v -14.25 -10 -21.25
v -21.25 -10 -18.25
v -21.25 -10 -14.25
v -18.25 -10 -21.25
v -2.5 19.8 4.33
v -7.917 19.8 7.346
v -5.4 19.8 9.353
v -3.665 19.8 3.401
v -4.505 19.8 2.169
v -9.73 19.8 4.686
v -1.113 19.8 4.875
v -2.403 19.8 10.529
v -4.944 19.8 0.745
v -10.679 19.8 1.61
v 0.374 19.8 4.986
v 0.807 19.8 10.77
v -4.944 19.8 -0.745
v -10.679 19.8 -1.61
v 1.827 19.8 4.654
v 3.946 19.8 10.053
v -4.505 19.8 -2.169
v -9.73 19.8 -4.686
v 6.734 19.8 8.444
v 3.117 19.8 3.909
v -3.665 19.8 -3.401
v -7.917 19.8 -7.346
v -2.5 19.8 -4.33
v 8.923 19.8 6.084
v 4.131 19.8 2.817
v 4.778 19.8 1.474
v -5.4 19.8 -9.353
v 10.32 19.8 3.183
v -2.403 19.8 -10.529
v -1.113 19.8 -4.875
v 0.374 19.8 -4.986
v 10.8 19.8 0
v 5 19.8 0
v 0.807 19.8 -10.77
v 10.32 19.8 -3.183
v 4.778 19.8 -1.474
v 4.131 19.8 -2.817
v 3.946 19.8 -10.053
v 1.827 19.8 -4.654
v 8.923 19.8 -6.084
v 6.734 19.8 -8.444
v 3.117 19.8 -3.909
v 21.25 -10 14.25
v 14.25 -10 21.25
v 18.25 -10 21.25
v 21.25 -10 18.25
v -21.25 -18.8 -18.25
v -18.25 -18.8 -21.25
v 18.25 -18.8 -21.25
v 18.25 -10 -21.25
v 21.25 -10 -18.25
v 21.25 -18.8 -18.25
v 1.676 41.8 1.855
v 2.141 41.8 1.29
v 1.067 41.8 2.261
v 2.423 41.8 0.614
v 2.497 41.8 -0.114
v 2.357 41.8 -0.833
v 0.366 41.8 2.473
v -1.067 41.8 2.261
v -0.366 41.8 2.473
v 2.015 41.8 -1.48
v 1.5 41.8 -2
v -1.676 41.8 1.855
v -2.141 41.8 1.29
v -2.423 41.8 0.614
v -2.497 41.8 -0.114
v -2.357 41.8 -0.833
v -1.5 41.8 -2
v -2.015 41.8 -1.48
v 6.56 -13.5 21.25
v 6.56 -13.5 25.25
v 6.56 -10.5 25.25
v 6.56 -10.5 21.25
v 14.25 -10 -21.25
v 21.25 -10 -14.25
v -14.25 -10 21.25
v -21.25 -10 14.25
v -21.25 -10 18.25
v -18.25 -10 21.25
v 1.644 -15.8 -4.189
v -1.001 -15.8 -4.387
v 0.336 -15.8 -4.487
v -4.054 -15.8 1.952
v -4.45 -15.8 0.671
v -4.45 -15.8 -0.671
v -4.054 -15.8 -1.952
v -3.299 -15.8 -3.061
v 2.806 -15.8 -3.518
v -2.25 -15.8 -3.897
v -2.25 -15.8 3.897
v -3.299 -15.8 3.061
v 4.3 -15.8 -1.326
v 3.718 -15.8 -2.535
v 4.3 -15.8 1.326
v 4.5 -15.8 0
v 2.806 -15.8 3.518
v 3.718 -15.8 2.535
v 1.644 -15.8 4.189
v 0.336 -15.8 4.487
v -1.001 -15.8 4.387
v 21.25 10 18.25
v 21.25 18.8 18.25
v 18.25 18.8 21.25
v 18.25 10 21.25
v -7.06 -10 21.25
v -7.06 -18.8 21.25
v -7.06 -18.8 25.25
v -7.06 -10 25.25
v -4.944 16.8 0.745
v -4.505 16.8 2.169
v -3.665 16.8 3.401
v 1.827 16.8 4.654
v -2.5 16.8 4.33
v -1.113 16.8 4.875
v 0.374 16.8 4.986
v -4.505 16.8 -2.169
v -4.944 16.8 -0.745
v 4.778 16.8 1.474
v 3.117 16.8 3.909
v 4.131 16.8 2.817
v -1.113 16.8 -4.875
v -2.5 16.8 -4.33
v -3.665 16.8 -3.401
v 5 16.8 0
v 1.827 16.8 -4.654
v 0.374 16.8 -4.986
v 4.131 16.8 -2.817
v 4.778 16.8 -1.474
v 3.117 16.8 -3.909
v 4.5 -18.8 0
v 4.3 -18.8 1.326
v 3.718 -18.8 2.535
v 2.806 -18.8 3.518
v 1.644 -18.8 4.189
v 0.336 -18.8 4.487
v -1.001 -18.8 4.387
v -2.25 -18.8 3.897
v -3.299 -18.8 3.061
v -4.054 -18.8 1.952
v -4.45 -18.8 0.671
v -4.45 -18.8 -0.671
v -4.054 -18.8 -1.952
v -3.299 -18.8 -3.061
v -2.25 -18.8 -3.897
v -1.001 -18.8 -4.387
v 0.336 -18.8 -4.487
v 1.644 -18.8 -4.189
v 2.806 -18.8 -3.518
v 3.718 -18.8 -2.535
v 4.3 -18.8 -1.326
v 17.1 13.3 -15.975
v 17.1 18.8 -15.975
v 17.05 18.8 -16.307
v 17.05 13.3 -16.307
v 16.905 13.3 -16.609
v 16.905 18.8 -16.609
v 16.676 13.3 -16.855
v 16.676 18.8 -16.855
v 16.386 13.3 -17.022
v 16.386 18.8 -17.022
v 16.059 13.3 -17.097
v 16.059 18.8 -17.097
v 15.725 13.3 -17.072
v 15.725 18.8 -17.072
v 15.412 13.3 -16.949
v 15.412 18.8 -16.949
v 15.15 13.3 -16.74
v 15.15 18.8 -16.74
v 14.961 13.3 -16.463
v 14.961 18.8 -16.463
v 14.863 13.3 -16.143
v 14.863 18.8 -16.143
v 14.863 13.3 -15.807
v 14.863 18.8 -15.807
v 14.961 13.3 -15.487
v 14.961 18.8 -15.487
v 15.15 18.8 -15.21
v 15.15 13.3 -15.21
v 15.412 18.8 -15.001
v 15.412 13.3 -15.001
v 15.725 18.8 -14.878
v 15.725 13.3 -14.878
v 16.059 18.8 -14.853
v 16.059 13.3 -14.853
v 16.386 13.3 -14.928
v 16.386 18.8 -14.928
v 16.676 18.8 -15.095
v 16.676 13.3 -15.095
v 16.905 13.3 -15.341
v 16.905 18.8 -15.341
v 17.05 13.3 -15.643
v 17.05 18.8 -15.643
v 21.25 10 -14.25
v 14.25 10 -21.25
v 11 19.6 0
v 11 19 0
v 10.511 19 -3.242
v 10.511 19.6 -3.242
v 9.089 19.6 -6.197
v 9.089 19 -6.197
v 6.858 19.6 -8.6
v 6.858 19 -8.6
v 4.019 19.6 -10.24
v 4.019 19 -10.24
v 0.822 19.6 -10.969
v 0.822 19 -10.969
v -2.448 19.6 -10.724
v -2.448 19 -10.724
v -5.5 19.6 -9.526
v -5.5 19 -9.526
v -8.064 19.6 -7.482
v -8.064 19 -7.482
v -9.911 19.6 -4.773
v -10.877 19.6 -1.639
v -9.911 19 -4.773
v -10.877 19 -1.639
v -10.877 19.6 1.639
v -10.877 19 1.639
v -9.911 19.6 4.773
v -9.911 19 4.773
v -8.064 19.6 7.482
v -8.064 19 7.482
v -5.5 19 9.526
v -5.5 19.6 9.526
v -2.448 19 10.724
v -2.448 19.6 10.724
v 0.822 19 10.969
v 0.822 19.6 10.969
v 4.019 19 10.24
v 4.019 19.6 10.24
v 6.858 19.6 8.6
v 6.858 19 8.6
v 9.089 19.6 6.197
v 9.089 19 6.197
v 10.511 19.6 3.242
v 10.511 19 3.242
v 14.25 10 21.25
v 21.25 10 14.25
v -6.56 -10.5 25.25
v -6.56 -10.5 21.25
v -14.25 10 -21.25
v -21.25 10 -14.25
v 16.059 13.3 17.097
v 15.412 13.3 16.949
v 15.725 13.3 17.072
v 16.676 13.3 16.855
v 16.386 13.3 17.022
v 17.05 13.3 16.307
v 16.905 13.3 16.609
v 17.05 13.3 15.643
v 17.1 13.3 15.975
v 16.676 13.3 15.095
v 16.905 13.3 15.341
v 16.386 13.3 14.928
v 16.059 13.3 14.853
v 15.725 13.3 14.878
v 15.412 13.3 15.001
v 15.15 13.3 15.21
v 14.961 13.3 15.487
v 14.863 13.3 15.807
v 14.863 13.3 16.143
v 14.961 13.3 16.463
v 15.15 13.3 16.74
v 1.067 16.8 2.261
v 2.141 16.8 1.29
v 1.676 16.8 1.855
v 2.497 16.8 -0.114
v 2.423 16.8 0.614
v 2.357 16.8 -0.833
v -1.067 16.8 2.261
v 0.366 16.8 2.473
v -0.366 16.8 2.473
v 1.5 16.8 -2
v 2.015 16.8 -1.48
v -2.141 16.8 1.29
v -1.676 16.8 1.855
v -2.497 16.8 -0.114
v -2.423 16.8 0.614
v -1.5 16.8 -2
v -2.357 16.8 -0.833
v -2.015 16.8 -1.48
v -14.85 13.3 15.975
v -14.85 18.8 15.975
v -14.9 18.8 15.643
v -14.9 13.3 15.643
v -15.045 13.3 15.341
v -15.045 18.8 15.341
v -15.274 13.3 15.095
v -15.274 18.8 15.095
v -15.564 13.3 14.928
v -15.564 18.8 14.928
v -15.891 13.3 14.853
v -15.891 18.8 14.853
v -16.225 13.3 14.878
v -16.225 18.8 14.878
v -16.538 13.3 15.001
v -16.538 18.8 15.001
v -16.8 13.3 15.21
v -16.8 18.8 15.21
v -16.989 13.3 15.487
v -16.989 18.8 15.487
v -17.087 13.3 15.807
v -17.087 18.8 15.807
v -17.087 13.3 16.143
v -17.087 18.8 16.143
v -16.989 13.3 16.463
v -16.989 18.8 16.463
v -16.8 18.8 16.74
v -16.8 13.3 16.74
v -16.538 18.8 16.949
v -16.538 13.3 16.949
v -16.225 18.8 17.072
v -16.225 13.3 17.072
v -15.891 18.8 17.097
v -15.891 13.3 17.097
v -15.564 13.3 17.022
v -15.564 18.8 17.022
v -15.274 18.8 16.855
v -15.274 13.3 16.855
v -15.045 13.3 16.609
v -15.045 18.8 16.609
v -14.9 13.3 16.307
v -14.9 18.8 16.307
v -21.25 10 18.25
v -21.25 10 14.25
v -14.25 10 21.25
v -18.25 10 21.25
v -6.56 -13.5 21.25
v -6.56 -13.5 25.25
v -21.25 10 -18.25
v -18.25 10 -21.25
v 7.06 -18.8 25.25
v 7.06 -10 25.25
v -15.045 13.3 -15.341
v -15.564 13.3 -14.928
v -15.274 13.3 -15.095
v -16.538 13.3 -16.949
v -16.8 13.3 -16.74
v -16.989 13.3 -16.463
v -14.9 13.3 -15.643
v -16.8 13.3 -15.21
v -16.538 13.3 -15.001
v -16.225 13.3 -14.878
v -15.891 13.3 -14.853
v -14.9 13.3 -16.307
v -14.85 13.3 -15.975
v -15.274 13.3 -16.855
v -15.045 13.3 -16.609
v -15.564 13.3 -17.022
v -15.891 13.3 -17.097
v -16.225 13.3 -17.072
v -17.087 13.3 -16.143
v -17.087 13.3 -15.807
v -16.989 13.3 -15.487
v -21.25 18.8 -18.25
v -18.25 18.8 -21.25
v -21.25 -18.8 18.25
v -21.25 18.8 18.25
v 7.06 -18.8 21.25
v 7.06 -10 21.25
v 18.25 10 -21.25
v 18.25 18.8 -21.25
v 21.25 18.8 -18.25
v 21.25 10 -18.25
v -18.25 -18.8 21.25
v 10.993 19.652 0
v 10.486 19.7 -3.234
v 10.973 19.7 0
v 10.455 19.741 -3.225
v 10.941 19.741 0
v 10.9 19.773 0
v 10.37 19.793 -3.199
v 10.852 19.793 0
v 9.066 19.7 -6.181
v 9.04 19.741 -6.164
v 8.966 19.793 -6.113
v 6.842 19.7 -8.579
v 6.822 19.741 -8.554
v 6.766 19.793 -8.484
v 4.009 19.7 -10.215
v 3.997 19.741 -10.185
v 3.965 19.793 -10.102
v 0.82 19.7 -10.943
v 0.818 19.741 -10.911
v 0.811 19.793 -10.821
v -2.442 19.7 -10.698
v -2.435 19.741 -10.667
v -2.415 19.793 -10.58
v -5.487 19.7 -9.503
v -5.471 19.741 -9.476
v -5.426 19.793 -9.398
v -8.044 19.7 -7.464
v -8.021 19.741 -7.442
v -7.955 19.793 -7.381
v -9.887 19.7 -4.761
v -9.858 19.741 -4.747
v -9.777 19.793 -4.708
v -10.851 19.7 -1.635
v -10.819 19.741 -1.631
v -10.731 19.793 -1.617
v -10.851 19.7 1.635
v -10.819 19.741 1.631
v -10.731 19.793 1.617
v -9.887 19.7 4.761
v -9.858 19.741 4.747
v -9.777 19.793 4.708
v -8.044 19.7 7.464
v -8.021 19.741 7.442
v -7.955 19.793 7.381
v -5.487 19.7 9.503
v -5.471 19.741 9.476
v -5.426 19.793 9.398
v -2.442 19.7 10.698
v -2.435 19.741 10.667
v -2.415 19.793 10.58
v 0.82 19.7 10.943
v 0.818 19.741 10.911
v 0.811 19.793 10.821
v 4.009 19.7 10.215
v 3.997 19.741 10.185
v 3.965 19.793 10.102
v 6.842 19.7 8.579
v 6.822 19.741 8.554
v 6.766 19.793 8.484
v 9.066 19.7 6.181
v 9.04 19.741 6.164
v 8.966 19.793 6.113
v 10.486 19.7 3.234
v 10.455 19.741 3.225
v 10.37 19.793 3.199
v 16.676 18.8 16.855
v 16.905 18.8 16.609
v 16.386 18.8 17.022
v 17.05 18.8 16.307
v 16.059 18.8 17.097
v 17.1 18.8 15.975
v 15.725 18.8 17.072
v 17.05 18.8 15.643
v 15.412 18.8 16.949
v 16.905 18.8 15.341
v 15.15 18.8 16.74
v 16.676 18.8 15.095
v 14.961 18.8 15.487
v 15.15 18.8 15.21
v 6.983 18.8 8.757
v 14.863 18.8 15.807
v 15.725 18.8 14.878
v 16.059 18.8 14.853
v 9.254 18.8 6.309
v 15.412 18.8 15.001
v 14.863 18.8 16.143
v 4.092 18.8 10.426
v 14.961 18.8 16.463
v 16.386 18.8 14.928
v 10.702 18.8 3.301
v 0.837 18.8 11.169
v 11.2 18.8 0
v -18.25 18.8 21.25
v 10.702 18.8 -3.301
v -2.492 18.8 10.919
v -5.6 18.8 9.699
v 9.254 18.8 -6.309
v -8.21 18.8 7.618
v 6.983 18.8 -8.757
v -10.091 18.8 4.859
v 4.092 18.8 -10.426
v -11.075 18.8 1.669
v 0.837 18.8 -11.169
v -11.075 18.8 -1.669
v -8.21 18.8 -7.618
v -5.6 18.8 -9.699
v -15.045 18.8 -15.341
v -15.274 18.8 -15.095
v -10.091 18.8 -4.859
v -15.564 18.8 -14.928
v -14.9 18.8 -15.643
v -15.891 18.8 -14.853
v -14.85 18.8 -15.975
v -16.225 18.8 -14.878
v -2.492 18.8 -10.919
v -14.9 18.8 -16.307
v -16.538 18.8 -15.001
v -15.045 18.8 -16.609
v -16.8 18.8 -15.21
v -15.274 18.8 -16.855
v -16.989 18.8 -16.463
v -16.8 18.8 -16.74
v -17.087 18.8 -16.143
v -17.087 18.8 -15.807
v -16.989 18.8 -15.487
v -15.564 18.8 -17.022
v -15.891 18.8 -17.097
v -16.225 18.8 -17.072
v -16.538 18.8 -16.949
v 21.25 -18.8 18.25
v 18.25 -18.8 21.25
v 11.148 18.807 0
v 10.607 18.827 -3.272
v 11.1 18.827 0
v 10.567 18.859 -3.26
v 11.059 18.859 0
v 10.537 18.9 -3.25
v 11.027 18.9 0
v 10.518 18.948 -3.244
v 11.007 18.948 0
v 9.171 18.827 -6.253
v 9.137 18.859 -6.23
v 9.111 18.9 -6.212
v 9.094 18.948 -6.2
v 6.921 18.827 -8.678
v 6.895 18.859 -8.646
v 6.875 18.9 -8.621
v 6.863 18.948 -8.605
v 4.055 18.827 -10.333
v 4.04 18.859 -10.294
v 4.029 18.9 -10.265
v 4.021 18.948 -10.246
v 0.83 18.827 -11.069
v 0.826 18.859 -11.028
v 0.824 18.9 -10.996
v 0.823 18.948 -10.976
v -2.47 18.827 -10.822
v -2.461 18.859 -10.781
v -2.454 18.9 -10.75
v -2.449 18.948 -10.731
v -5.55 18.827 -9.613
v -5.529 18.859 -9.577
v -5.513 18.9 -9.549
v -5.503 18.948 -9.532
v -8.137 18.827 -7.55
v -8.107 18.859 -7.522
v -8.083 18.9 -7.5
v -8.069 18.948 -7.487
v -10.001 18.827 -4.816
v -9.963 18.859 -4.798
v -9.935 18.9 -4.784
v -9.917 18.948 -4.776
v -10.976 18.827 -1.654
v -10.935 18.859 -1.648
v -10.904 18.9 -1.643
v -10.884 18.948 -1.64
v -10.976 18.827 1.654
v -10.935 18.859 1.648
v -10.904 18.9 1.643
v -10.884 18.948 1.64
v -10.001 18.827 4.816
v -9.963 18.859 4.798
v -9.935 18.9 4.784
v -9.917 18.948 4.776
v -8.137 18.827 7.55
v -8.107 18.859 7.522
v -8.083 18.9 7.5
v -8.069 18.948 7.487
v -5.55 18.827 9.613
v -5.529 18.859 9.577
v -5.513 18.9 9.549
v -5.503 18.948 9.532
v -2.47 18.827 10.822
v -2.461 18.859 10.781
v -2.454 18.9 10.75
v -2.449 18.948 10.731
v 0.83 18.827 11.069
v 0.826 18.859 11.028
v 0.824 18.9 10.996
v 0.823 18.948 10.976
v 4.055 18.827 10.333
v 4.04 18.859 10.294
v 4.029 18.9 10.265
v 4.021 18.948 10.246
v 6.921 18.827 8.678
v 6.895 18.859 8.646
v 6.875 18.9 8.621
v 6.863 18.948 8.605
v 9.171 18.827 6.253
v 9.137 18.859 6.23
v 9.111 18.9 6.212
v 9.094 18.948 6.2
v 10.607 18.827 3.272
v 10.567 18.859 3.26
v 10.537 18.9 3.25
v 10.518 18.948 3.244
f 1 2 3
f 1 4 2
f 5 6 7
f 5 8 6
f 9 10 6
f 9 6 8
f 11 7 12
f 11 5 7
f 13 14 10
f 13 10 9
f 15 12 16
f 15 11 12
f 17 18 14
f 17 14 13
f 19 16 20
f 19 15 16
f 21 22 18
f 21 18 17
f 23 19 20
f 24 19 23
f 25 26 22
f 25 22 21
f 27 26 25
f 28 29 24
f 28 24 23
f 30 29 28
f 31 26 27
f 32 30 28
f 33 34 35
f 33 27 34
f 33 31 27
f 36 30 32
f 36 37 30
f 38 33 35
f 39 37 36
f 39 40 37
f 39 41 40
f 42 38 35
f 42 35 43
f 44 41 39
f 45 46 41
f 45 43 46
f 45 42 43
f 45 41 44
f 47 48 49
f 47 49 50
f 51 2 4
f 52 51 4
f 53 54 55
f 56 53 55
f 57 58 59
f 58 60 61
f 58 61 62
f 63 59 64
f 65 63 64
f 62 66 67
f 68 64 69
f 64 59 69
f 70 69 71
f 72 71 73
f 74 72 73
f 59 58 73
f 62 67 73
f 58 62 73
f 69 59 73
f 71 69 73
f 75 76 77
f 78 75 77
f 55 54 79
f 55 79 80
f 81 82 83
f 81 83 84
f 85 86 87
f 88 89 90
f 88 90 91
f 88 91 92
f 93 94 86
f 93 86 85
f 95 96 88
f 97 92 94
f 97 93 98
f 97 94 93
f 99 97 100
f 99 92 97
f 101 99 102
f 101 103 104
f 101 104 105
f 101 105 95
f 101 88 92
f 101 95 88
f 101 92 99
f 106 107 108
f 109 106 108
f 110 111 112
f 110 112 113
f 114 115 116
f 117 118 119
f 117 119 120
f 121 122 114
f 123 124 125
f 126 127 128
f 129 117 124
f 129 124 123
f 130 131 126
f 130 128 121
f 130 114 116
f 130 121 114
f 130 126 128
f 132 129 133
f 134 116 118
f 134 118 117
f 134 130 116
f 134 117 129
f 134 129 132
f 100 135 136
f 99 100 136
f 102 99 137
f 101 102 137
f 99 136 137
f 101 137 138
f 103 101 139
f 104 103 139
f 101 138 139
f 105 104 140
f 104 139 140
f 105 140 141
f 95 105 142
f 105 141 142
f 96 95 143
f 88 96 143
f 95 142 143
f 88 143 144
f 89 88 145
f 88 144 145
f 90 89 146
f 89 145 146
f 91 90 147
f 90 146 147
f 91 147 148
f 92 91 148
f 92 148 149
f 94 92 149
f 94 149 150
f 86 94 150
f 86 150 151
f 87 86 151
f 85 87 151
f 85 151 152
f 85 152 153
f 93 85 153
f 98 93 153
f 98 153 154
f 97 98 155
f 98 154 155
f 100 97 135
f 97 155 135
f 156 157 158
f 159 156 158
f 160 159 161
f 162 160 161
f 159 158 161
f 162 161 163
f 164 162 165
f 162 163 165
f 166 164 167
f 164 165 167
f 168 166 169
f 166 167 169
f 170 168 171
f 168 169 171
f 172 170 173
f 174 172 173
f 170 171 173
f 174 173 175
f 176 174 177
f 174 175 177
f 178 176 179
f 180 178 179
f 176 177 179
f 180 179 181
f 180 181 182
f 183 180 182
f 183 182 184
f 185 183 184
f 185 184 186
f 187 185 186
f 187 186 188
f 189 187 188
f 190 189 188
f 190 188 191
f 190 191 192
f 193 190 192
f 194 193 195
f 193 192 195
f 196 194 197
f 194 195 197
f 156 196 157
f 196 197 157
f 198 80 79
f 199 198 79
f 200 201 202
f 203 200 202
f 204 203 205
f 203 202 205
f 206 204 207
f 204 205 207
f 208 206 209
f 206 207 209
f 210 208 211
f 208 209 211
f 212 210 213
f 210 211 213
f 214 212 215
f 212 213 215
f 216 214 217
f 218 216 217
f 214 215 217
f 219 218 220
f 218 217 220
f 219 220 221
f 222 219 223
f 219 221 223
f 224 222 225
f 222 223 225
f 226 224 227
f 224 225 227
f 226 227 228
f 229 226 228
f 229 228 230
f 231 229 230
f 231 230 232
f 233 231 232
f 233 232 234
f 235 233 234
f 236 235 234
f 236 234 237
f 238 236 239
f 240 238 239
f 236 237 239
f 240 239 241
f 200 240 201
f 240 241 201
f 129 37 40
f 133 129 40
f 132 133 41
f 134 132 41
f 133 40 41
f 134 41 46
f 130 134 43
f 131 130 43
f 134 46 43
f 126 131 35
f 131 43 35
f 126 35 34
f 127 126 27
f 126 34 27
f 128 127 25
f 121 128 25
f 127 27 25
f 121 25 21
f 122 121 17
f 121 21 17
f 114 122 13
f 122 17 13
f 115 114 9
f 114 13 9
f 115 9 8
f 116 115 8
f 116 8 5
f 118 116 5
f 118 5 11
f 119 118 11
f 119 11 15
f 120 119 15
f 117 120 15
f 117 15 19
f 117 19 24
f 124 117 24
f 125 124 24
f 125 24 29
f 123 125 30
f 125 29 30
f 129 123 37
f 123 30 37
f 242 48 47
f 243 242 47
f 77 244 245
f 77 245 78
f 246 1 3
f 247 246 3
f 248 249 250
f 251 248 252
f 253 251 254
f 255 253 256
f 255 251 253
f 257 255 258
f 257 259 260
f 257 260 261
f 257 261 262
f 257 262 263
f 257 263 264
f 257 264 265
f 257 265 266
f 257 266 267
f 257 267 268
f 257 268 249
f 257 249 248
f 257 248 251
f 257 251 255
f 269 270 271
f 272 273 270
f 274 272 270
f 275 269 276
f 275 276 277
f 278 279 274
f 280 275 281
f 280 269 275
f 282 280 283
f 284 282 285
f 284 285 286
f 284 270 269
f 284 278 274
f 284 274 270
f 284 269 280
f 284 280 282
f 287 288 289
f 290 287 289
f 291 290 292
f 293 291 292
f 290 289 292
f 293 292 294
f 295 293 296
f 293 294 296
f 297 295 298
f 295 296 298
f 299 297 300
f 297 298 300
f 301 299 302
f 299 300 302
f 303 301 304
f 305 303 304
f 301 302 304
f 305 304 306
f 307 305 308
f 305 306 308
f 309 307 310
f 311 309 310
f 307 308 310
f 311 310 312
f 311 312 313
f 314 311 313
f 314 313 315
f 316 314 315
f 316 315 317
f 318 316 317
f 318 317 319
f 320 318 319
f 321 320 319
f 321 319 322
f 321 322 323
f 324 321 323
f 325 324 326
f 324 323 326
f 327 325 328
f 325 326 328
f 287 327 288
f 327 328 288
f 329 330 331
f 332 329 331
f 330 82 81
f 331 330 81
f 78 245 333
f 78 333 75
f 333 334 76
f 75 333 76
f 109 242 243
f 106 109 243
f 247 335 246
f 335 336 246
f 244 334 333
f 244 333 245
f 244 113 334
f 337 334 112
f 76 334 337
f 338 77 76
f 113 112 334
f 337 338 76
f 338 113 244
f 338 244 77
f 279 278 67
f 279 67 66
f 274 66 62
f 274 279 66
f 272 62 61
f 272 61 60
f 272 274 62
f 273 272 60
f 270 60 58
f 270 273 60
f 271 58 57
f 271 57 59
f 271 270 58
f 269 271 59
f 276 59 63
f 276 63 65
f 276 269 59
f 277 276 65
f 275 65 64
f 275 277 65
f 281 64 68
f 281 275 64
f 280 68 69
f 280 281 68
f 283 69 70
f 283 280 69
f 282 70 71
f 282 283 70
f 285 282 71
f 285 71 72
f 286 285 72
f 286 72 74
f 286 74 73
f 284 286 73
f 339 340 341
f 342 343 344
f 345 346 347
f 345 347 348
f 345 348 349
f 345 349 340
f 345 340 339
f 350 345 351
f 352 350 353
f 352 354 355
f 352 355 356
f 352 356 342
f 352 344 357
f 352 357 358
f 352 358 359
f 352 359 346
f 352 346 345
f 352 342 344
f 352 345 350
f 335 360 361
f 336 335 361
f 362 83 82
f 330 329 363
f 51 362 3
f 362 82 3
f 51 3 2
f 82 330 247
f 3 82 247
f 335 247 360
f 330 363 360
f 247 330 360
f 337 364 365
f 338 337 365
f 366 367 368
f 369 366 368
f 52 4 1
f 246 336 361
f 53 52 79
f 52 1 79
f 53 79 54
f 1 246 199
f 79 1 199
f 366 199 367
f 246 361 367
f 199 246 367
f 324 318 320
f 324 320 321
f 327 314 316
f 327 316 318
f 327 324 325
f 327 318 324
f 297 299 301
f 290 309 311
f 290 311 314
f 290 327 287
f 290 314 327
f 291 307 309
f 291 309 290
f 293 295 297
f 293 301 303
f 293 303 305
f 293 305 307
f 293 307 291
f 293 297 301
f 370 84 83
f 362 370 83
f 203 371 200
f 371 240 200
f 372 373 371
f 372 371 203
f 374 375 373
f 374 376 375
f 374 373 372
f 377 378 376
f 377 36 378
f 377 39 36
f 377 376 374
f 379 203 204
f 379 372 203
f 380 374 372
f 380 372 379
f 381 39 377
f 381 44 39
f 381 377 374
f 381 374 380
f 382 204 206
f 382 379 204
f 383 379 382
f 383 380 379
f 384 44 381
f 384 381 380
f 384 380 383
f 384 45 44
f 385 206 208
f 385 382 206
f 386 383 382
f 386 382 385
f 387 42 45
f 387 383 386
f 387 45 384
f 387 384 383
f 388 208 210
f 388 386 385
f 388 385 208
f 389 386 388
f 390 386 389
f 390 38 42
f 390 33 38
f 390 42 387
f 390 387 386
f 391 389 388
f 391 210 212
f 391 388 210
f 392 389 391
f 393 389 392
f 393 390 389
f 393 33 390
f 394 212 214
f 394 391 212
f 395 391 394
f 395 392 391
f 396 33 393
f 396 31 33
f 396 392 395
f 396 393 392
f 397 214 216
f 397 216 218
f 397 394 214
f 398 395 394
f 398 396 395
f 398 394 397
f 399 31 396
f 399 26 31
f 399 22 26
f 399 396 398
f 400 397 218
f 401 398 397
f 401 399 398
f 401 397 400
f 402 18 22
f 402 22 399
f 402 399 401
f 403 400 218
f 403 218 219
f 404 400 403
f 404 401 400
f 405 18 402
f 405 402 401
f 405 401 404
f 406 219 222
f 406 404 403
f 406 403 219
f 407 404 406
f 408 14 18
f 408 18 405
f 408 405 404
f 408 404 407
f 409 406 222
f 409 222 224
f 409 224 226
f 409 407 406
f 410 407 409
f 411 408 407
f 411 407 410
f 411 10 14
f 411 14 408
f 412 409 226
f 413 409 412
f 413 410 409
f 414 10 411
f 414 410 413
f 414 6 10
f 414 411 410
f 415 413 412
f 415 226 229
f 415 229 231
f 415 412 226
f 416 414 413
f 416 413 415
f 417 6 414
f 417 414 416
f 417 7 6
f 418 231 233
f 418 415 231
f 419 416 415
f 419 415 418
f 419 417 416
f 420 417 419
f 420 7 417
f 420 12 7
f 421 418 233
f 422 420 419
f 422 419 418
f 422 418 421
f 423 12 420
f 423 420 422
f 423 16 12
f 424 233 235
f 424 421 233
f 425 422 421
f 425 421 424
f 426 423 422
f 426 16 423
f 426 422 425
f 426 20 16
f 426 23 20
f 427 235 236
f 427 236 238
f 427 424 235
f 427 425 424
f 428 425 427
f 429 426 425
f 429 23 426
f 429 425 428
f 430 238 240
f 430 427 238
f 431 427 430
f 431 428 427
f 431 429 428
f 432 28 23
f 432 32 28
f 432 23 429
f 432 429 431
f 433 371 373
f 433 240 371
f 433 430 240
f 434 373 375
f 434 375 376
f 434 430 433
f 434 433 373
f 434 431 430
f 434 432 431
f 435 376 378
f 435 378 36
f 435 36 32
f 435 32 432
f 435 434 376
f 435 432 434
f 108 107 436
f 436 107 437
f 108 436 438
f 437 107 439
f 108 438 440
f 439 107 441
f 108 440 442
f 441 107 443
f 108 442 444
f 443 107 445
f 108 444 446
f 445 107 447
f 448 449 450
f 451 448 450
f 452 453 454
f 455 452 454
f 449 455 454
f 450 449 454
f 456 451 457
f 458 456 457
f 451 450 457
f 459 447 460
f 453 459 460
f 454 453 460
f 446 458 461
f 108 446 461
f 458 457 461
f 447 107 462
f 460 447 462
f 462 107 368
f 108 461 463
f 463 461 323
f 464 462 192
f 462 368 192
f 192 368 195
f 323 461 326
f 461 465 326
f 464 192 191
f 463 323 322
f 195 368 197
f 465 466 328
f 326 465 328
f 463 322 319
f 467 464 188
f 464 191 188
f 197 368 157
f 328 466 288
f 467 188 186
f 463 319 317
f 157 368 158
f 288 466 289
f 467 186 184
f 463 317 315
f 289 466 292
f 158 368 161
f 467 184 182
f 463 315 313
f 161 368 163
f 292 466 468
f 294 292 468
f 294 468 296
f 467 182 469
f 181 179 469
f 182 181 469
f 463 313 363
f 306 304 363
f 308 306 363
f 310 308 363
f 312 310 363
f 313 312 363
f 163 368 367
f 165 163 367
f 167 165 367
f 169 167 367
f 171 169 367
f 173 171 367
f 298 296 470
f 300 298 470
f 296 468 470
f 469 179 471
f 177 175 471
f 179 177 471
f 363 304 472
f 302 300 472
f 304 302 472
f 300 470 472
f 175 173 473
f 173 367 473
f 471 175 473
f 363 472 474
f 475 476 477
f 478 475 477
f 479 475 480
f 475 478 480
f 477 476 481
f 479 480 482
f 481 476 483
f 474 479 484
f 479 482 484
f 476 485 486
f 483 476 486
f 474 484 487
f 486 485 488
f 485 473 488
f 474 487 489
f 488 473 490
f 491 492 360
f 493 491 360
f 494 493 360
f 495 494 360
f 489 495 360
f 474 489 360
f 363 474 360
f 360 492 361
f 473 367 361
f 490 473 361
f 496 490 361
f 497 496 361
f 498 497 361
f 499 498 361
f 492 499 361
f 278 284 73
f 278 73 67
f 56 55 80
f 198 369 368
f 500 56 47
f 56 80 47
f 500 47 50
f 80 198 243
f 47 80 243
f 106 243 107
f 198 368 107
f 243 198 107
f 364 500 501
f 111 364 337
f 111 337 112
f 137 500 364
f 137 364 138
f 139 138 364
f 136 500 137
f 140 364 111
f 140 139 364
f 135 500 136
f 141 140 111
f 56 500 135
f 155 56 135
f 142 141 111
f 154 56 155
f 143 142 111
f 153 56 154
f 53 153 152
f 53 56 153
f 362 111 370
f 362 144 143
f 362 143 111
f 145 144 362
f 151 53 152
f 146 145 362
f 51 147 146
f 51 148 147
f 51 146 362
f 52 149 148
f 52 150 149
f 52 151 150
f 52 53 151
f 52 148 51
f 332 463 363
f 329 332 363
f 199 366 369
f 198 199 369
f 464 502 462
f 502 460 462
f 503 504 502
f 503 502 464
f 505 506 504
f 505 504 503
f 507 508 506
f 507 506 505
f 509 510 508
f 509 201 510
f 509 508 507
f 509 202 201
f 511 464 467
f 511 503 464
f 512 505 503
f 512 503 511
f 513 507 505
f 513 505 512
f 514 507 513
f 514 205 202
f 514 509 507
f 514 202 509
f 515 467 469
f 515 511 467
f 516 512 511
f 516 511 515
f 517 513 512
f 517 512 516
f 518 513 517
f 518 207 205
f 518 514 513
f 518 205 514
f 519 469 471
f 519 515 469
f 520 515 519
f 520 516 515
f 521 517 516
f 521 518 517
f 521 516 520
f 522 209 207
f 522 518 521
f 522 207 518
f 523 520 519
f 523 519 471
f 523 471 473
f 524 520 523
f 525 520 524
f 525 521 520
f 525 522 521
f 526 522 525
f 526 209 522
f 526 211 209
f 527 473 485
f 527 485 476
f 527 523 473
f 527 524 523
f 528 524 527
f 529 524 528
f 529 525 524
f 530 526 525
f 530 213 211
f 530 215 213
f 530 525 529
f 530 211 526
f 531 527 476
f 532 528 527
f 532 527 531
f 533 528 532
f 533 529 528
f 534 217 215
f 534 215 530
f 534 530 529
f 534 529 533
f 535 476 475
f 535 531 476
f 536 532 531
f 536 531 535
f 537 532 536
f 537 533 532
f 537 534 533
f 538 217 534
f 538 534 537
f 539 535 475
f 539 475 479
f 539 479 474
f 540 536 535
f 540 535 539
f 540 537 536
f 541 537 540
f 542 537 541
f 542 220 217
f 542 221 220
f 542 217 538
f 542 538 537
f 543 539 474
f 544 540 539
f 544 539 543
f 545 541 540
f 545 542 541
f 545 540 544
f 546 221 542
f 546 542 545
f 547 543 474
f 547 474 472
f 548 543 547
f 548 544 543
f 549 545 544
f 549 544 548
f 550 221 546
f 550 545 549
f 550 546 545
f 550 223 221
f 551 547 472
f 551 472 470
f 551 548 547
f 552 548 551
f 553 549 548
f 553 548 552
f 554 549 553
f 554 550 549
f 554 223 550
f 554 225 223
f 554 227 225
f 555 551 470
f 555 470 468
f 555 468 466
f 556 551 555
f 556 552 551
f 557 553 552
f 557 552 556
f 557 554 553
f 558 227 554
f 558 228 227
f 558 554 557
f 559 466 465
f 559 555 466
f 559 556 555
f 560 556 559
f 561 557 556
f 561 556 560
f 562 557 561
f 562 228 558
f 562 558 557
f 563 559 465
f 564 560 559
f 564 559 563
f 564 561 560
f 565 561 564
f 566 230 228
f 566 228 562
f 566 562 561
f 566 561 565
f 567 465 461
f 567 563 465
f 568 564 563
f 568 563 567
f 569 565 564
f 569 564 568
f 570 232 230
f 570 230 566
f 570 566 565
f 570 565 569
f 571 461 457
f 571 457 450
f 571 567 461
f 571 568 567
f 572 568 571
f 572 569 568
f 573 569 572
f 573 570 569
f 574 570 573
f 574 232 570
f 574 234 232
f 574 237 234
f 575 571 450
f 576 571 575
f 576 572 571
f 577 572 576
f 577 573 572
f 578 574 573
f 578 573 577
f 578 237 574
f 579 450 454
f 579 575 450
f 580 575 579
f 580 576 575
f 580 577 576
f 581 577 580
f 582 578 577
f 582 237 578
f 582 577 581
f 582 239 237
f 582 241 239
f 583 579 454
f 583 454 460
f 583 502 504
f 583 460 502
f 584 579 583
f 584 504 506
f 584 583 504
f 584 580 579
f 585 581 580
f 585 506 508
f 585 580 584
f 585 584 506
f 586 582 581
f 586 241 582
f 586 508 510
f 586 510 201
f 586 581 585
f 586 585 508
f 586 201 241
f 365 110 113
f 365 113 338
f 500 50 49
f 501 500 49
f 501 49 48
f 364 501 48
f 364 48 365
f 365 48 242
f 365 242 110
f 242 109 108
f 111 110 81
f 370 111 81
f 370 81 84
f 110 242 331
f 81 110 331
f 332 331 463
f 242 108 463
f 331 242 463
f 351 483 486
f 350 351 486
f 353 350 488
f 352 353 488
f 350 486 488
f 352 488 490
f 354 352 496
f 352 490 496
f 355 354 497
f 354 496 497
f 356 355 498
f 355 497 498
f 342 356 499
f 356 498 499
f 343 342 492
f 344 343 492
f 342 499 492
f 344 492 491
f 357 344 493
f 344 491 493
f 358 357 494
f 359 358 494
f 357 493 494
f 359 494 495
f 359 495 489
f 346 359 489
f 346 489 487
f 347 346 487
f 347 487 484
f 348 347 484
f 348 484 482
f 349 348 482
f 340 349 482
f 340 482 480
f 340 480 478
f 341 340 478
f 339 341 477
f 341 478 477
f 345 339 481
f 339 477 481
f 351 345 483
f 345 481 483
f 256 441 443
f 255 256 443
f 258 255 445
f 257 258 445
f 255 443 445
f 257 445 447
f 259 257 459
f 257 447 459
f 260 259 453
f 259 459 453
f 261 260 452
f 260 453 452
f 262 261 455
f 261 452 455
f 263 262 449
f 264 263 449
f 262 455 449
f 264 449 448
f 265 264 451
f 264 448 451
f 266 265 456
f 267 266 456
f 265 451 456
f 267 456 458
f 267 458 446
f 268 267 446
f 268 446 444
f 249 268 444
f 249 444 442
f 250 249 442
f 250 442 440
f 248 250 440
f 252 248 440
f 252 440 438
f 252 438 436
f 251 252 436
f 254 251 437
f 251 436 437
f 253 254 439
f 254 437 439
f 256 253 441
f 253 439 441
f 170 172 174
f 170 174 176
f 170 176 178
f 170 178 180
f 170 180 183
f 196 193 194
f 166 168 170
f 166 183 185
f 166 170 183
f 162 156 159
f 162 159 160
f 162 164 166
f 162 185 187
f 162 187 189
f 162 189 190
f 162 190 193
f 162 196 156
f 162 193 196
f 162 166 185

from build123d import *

# Parameters (mm, degrees)
BOSS_EXTRUDE1_DEPTH   = 18.8
SKETCH2_OUTSIDE_W     = 58.68
SKETCH2_OUTSIDE_H     = 58.68
CUT_EXTRUDE1_DEPTH    = 10
SKETCH3_W             = 14.12047277
SKETCH3_H             = 8.8
BOSS_EXTRUDE2_DEPTH   = 4
SKETCH4_W             = 13.12047277
SKETCH4_H             = 3
CUT_EXTRUDE2_DEPTH    = 4
SKETCH5_R             = 4.5
CUT_EXTRUDE3_DEPTH    = 3
SKETCH6_R             = 11
BOSS_EXTRUDE3_DEPTH   = 1
FILLET1_R             = 0.2
SKETCH7_R             = 5
CUT_EXTRUDE4_DEPTH    = 3
BOSS_EXTRUDE4_DEPTH   = 25
ESBO_O1_R             = 1.125
CORTE_EXTRUS_O1_DEPTH = 5.5


with BuildPart() as part:
    # Sketch1 → Boss-Extrude1 (new body, symmetric)
    with BuildSketch(Plane(origin=(0, 0, 0), x_dir=(1, 0, 0), z_dir=(0, 1, 0))):
        Polygon((-21.25, 18.25), (-18.25, 21.25), (18.25, 21.25), (21.25, 18.25), (21.25, -18.25), (18.25, -21.25), (-18.25, -21.25), (-21.25, -18.25), align=None)
    extrude(amount=BOSS_EXTRUDE1_DEPTH, both=True)

    # Sketch2 outside → Cut-Extrude1 (cut, symmetric)
    with BuildSketch(Plane(origin=(0, 0, 0), x_dir=(1, 0, 0), z_dir=(0, 1, 0))):
        Rectangle(SKETCH2_OUTSIDE_W, SKETCH2_OUTSIDE_H)
        Polygon((-21.25, 14.25), (-21.25, -14.25), (-14.25, -21.25), (14.25, -21.25), (21.25, -14.25), (21.25, 14.25), (14.25, 21.25), (-14.25, 21.25), align=None, mode=Mode.SUBTRACT)
    extrude(amount=CUT_EXTRUDE1_DEPTH, both=True, mode=Mode.SUBTRACT)

    # Sketch3 → Boss-Extrude2 (add)
    with BuildSketch(Plane.XY.offset(21.25)):
        with Locations((0, -14.4)):
            Rectangle(SKETCH3_W, SKETCH3_H)
    extrude(amount=BOSS_EXTRUDE2_DEPTH)

    # Sketch4 → Cut-Extrude2 (cut)
    with BuildSketch(Plane.XY.offset(25.25)):
        with Locations((0, -12)):
            Rectangle(SKETCH4_W, SKETCH4_H)
    extrude(amount=-CUT_EXTRUDE2_DEPTH, mode=Mode.SUBTRACT)

    # Sketch5 → Cut-Extrude3 (cut)
    with BuildSketch(Plane.XZ.offset(18.8)):
        Circle(SKETCH5_R)
    extrude(amount=-CUT_EXTRUDE3_DEPTH, mode=Mode.SUBTRACT)

    # Sketch6 → Boss-Extrude3 (add)
    with BuildSketch(Plane(origin=(0, 18.8, 0), x_dir=(1, 0, 0), z_dir=(0, 1, 0))):
        Circle(SKETCH6_R)
    extrude(amount=BOSS_EXTRUDE3_DEPTH)

    # Fillet1
    fillet1_edges = [part.edges().sort_by_distance(p)[0] for p in [
        (-11, 18.8, 0),
        (-11, 19.8, 0),
    ]]
    fillet(fillet1_edges, radius=FILLET1_R)

    # Sketch7 → Cut-Extrude4 (cut)
    with BuildSketch(Plane(origin=(0, 19.8, 0), x_dir=(1, 0, 0), z_dir=(0, 1, 0))):
        Circle(SKETCH7_R)
    extrude(amount=-CUT_EXTRUDE4_DEPTH, mode=Mode.SUBTRACT)

    # Esboço1 → Corte-extrusão1 (cut)
    with BuildSketch(Plane(origin=(0, 18.8, 0), x_dir=(1, 0, 0), z_dir=(0, 1, 0))):
        with Locations((-15.975, 15.975)):
            Circle(ESBO_O1_R)
        with Locations((15.975, 15.975)):
            Circle(ESBO_O1_R)
        with Locations((15.975, -15.975)):
            Circle(ESBO_O1_R)
        with Locations((-15.975, -15.975)):
            Circle(ESBO_O1_R)
    extrude(amount=-CORTE_EXTRUS_O1_DEPTH, mode=Mode.SUBTRACT)


with BuildPart() as body_2:
    # Sketch8 → Boss-Extrude4 (new body)
    with BuildSketch(Plane(origin=(0, 16.8, 0), x_dir=(1, 0, 0), z_dir=(0, 1, 0))):
        with BuildLine():
            Line((-1.5, 2), (1.5, 2))
            ThreePointArc((1.5, 2), (0, -2.5), (-1.5, 2))
        make_face()
    extrude(amount=BOSS_EXTRUDE4_DEPTH)


solid = Compound([part.part, body_2.part])
